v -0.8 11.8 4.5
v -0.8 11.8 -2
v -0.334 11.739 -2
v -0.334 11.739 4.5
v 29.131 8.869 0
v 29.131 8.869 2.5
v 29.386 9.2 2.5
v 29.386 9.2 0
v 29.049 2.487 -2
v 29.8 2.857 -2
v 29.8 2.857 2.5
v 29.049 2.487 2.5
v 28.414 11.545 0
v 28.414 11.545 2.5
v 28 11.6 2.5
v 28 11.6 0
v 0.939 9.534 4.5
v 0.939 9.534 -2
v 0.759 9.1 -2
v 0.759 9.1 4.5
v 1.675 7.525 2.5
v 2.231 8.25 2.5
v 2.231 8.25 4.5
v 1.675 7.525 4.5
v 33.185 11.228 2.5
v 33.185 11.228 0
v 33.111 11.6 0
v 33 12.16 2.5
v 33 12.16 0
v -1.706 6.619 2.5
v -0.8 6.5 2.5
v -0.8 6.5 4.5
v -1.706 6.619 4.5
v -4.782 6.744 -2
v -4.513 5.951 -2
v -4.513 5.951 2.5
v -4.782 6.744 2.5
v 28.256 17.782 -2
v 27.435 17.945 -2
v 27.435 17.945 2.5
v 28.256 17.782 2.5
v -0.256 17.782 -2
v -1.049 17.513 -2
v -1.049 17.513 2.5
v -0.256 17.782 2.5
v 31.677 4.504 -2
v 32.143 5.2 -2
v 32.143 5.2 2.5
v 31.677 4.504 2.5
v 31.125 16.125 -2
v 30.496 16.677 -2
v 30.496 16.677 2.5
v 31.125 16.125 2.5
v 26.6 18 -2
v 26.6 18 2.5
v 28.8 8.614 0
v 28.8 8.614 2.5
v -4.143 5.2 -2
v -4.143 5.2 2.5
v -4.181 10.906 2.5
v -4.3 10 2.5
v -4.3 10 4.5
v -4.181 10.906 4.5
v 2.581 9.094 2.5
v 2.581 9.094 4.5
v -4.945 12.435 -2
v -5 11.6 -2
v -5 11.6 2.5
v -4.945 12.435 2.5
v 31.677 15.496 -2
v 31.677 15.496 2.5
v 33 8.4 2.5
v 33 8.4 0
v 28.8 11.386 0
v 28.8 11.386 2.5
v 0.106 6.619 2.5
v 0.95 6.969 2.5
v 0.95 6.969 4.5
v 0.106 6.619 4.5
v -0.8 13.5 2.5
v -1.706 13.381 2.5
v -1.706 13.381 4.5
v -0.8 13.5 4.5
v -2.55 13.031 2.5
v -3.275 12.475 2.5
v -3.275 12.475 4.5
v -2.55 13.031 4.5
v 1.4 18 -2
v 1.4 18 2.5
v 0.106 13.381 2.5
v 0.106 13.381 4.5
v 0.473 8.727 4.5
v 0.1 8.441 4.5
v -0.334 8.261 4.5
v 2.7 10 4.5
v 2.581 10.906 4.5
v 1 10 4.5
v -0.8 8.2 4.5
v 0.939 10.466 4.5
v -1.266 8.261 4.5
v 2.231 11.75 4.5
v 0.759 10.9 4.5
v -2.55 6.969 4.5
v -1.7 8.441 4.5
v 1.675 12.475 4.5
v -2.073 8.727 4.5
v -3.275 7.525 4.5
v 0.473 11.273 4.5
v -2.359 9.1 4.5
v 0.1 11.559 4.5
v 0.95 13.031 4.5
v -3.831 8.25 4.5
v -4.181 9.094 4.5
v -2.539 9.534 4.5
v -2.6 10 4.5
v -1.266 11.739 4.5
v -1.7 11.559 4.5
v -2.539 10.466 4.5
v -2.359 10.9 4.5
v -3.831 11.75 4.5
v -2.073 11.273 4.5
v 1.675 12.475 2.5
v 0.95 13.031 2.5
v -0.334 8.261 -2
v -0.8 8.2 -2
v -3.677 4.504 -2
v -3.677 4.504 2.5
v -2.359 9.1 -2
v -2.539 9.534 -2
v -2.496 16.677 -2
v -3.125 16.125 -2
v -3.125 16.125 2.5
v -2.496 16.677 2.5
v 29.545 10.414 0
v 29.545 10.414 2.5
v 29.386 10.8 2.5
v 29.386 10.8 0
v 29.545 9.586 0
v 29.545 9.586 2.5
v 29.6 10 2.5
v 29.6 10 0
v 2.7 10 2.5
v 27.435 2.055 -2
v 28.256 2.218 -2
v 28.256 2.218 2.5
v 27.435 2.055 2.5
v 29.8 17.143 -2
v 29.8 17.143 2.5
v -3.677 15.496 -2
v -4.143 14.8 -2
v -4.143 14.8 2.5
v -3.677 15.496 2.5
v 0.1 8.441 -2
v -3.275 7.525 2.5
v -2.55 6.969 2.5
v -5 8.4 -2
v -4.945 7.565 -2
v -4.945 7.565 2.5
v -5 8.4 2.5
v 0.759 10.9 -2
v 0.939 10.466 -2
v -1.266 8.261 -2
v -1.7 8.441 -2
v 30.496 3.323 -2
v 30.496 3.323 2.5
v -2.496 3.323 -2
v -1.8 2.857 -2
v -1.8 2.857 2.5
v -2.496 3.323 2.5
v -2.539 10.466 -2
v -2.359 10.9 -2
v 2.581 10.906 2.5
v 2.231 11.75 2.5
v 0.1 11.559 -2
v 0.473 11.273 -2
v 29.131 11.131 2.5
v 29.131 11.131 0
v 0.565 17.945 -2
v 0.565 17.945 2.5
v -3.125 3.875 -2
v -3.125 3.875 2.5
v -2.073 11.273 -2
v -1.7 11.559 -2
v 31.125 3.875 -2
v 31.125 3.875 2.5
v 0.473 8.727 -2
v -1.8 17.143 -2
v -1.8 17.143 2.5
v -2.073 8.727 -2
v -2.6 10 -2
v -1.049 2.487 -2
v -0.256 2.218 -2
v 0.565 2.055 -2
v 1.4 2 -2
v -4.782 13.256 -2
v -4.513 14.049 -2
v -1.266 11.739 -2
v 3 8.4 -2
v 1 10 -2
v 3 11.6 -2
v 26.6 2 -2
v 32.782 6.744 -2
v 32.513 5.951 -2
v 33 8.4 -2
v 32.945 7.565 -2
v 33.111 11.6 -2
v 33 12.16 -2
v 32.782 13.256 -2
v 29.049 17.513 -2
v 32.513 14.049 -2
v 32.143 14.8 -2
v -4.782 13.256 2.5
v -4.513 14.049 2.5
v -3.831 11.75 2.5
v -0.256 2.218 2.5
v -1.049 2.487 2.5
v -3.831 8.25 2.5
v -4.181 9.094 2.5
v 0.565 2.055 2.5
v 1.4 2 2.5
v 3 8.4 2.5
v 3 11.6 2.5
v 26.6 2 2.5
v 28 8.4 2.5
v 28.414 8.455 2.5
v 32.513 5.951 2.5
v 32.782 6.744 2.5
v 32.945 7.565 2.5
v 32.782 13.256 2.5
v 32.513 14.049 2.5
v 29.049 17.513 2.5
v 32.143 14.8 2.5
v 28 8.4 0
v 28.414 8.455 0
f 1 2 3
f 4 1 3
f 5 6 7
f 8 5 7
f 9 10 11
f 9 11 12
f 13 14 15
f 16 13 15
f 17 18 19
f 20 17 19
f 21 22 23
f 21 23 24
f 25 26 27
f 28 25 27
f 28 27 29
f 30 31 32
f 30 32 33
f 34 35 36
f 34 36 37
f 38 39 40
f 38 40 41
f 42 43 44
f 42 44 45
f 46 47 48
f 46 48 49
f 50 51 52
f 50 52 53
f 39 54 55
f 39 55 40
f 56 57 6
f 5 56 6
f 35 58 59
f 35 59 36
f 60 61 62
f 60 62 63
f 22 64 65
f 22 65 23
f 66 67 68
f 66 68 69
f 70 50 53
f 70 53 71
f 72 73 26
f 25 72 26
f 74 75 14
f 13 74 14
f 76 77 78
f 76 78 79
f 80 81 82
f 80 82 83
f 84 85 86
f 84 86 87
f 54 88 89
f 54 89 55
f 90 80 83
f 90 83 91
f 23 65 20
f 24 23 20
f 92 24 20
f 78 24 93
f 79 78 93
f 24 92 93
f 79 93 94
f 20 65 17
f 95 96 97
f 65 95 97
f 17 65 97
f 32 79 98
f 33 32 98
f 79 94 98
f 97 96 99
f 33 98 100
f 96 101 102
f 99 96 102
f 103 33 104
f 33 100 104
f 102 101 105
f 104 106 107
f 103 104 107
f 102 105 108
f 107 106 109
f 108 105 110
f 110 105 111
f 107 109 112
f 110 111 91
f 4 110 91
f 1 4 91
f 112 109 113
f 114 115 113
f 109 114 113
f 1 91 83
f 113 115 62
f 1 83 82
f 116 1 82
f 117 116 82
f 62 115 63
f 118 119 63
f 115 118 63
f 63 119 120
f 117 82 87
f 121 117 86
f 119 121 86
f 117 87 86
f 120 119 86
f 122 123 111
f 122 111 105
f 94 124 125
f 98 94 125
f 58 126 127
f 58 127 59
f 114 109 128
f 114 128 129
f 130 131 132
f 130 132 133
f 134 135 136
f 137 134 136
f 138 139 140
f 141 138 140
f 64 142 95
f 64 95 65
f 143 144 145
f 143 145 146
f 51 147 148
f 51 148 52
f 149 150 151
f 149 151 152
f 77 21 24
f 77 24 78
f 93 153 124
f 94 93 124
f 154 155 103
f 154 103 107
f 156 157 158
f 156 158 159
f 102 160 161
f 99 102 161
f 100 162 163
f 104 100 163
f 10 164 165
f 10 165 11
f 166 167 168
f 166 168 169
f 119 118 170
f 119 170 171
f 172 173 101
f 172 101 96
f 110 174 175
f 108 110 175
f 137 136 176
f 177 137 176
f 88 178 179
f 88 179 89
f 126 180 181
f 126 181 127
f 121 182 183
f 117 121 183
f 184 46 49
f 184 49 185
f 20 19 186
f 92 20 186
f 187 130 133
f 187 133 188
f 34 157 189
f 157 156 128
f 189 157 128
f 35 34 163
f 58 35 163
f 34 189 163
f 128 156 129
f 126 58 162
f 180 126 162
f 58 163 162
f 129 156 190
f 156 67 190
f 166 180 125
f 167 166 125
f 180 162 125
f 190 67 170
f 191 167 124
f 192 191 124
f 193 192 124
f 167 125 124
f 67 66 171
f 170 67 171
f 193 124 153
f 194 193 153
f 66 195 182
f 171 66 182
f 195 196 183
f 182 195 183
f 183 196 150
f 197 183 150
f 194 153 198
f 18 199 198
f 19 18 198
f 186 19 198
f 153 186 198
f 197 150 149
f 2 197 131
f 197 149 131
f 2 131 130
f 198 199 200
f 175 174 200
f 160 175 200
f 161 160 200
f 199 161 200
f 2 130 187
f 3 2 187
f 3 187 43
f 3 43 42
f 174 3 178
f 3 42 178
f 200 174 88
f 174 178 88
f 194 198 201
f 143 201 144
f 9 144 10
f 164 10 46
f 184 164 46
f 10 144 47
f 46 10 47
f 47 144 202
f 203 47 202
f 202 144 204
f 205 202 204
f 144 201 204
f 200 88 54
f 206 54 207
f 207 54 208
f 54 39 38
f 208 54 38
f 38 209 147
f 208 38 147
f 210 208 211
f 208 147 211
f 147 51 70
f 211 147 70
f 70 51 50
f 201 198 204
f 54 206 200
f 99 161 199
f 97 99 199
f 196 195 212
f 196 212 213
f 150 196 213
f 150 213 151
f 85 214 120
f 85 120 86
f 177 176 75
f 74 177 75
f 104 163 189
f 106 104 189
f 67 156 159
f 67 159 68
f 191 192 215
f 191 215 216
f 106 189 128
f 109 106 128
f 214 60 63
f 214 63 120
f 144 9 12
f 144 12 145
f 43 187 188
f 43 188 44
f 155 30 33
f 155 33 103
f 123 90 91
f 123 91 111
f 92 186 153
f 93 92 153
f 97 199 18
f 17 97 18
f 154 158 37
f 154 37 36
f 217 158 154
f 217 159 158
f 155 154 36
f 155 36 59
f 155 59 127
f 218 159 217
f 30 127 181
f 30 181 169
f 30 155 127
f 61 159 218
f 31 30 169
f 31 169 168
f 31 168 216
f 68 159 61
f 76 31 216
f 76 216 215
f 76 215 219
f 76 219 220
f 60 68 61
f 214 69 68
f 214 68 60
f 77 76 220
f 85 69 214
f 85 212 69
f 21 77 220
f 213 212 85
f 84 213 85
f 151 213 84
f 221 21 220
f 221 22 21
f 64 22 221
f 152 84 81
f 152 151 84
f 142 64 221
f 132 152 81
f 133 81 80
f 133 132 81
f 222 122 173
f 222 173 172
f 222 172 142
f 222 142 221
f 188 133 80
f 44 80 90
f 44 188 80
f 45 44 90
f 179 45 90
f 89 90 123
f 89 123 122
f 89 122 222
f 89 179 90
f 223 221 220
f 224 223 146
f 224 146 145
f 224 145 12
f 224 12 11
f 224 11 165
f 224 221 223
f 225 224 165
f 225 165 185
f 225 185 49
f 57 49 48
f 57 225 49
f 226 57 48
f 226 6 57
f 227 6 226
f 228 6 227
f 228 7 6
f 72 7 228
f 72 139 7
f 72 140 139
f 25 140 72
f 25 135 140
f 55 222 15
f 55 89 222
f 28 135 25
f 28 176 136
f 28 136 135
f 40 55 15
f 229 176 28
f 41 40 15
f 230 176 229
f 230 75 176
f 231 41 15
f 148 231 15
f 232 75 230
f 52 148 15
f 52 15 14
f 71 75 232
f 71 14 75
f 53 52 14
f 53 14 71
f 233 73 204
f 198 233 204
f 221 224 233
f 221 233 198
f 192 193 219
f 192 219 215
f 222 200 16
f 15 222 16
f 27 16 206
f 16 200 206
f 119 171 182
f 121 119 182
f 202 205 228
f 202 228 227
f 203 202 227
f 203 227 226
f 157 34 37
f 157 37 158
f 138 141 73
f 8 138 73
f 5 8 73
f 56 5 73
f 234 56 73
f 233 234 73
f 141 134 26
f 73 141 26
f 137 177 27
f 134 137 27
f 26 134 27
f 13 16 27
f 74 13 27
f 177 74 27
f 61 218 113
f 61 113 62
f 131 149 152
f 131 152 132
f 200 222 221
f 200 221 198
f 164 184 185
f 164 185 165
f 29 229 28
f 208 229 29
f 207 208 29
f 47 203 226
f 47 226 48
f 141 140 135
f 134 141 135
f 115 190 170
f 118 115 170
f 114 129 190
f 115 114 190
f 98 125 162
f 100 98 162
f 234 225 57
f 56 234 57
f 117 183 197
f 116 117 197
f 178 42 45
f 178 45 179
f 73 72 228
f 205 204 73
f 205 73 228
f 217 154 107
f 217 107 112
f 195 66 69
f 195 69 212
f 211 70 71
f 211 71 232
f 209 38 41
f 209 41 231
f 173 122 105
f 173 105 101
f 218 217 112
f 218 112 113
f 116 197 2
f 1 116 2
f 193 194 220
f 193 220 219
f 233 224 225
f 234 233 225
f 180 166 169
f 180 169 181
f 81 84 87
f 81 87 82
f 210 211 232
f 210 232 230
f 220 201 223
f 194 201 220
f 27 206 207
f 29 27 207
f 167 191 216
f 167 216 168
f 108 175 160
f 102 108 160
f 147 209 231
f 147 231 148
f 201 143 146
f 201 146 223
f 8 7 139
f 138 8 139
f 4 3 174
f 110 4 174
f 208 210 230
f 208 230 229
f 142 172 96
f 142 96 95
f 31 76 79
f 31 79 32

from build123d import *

# Parameters (mm, degrees)
BOSS_EXTRUDE1_DEPTH = 4.5
CUT_EXTRUDE1_DEPTH  = 2.5
CUT_EXTRUDE2_DEPTH  = 0.414110472
CUT_EXTRUDE3_DEPTH  = 0.414110472
CUT_EXTRUDE4_DEPTH  = 0.385889528
CUT_EXTRUDE5_DEPTH  = 0.385889528
CUT_EXTRUDE6_DEPTH  = 0.33137085
CUT_EXTRUDE7_DEPTH  = 0.33137085
CUT_EXTRUDE8_DEPTH  = 0.254269796
SKETCH10_W          = 5
SKETCH10_H          = 2
CUT_EXTRUDE9_DEPTH  = 0.214359354
CUT_EXTRUDE10_DEPTH = 0.254269796
SKETCH12_W          = 5
SKETCH12_H          = 2
CUT_EXTRUDE11_DEPTH = 0.214359354
SKETCH13_W          = 4.5
SKETCH13_H          = 3.2
CUT_EXTRUDE12_DEPTH = 25
BOSS_EXTRUDE2_DEPTH = 2
CUT_EXTRUDE13_DEPTH = 39.14773912
DRAFT1_START        = -2
DRAFT1_DEPTH        = 4.5
DRAFT1_2_DEPTH      = 2.5
DRAFT1_3_DEPTH      = 2


# Read off the part's stored shape, not the designer's step: Draft1
with BuildPart() as part:
    # Sketch1 → Boss-Extrude1 (new body)
    with BuildSketch(Plane(origin=(0, 0, -2), x_dir=(-1, 0, 0), z_dir=(0, 0, -1))):
        Polygon((-33, 12.160106278), (-33, 7.839893722), (-32.781925288, 6.743558111), (-32.512829008, 5.950826033), (-32.142562584, 5.2), (-31.677461378, 4.503926854), (-31.1254834, 3.8745166), (-30.496073146, 3.322538622), (-29.8, 2.857437416), (-29.049173967, 2.487170992), (-28.256441889, 2.218074712), (-27.43536763, 2.054752887), (-26.6, 2), (-1.4, 2), (-0.56463237, 2.054752887), (0.256441889, 2.218074712), (1.049173967, 2.487170992), (1.8, 2.857437416), (2.496073146, 3.322538622), (3.1254834, 3.8745166), (3.677461378, 4.503926854), (4.142562584, 5.2), (4.512829008, 5.950826033), (4.781925288, 6.743558111), (4.945247113, 7.56463237), (5, 8.4), (5, 11.6), (4.945247113, 12.43536763), (4.781925288, 13.256441889), (4.512829008, 14.049173967), (4.142562584, 14.8), (3.677461378, 15.496073146), (3.1254834, 16.1254834), (2.496073146, 16.677461378), (1.8, 17.142562584), (1.049173967, 17.512829008), (0.256441889, 17.781925288), (-0.56463237, 17.945247113), (-1.4, 18), (-26.6, 18), (-27.43536763, 17.945247113), (-28.256441889, 17.781925288), (-29.049173967, 17.512829008), (-29.8, 17.142562584), (-30.496073146, 16.677461378), (-31.1254834, 16.1254834), (-31.677461378, 15.496073146), (-32.142562584, 14.8), (-32.512829008, 14.049173967), (-32.781925288, 13.256441889), align=None)
    extrude(amount=-BOSS_EXTRUDE1_DEPTH)

    # Sketch2 → Cut-Extrude1 (cut)
    with BuildSketch(Plane.XY.offset(2.5)):
        Polygon((29.6, 10), (29.545481322, 10.414110472), (29.385640646, 10.8), (29.13137085, 11.13137085), (28.8, 11.385640646), (28.414110472, 11.545481322), (28, 11.6), (28, 8.4), (28.414110472, 8.454518678), (28.8, 8.614359354), (29.13137085, 8.86862915), (29.385640646, 9.2), (29.545481322, 9.585889528), align=None)
    extrude(amount=-CUT_EXTRUDE1_DEPTH, mode=Mode.SUBTRACT)

    # Sketch3 → Cut-Extrude2 (cut)
    with BuildSketch(Plane.XZ.offset(-10)):
        Polygon((28, 0), (28, -2), (33, -2), (33, 0), (29.545481322, 0), align=None)
    extrude(amount=-CUT_EXTRUDE2_DEPTH, mode=Mode.SUBTRACT)

    # Sketch4 → Cut-Extrude3 (cut)
    with BuildSketch(Plane(origin=(0, 10, 0), x_dir=(-1, 0, 0), z_dir=(0, 1, 0))):
        Polygon((-28, -2), (-28, 0), (-29.545481322, 0), (-33, 0), (-33, -2), align=None)
    extrude(amount=-CUT_EXTRUDE3_DEPTH, mode=Mode.SUBTRACT)

    # Sketch5 → Cut-Extrude4 (cut)
    with BuildSketch(Plane.XZ.offset(-10.414110472)):
        Polygon((28, 0), (28, -2), (33, -2), (33, 0), (29.385640646, 0), align=None)
    extrude(amount=-CUT_EXTRUDE4_DEPTH, mode=Mode.SUBTRACT)

    # Sketch6 → Cut-Extrude5 (cut)
    with BuildSketch(Plane(origin=(0, 9.585889528, 0), x_dir=(-1, 0, 0), z_dir=(0, 1, 0))):
        Polygon((-28, -2), (-28, 0), (-29.385640646, 0), (-33, 0), (-33, -2), align=None)
    extrude(amount=-CUT_EXTRUDE5_DEPTH, mode=Mode.SUBTRACT)

    # Sketch7 → Cut-Extrude6 (cut)
    with BuildSketch(Plane.XZ.offset(-10.8)):
        Polygon((28, 0), (28, -2), (33, -2), (33, 0), (29.13137085, 0), align=None)
    extrude(amount=-CUT_EXTRUDE6_DEPTH, mode=Mode.SUBTRACT)

    # Sketch8 → Cut-Extrude7 (cut)
    with BuildSketch(Plane(origin=(0, 9.2, 0), x_dir=(-1, 0, 0), z_dir=(0, 1, 0))):
        Polygon((-28, -2), (-28, 0), (-29.13137085, 0), (-33, 0), (-33, -2), align=None)
    extrude(amount=-CUT_EXTRUDE7_DEPTH, mode=Mode.SUBTRACT)

    # Sketch9 → Cut-Extrude8 (cut)
    with BuildSketch(Plane.XZ.offset(-11.13137085)):
        Polygon((28, 0), (28, -2), (33, -2), (33, 0), (28.8, 0), align=None)
    extrude(amount=-CUT_EXTRUDE8_DEPTH, mode=Mode.SUBTRACT)

    # Sketch10 → Cut-Extrude9 (cut)
    with BuildSketch(Plane.XZ.offset(-11.385640646)):
        with Locations((30.5, -1)):
            Rectangle(SKETCH10_W, SKETCH10_H)
    extrude(amount=-CUT_EXTRUDE9_DEPTH, mode=Mode.SUBTRACT)

    # Sketch11 → Cut-Extrude10 (cut)
    with BuildSketch(Plane(origin=(0, 8.86862915, 0), x_dir=(-1, 0, 0), z_dir=(0, 1, 0))):
        Polygon((-28, -2), (-28, 0), (-28.8, 0), (-33, 0), (-33, -2), align=None)
    extrude(amount=-CUT_EXTRUDE10_DEPTH, mode=Mode.SUBTRACT)

    # Sketch12 → Cut-Extrude11 (cut)
    with BuildSketch(Plane(origin=(0, 8.614359354, 0), x_dir=(-1, 0, 0), z_dir=(0, 1, 0))):
        with Locations((-30.5, -1)):
            Rectangle(SKETCH12_W, SKETCH12_H)
    extrude(amount=-CUT_EXTRUDE11_DEPTH, mode=Mode.SUBTRACT)

    # Sketch13 → Cut-Extrude12 (cut)
    with BuildSketch(Plane(origin=(28, 0, 0), x_dir=(0, 0, -1), z_dir=(1, 0, 0))):
        with Locations((-0.25, 10)):
            Rectangle(SKETCH13_W, SKETCH13_H)
    extrude(amount=-CUT_EXTRUDE12_DEPTH, mode=Mode.SUBTRACT)

    # Sketch14 → Boss-Extrude2 (add)
    with BuildSketch(Plane.XY.offset(2.5)):
        Polygon((1.674873734, 12.474873734), (2.231088913, 11.75), (2.580740392, 10.905866658), (2.7, 10), (2.580740392, 9.094133342), (2.231088913, 8.25), (1.674873734, 7.525126266), (0.95, 6.968911087), (0.105866658, 6.619259608), (-0.8, 6.5), (-1.705866658, 6.619259608), (-2.55, 6.968911087), (-3.274873734, 7.525126266), (-3.831088913, 8.25), (-4.180740392, 9.094133342), (-4.3, 10), (-4.180740392, 10.905866658), (-3.831088913, 11.75), (-3.274873734, 12.474873734), (-2.55, 13.031088913), (-1.705866658, 13.380740392), (-0.8, 13.5), (0.105866658, 13.380740392), (0.95, 13.031088913), align=None)
    extrude(amount=BOSS_EXTRUDE2_DEPTH)

    # Sketch15 → Cut-Extrude13 (cut, through all)
    with BuildSketch(Plane(origin=(0, 0, -2), x_dir=(-1, 0, 0), z_dir=(0, 0, -1))):
        Polygon((-0.938666487, 9.534125719), (-0.758845727, 9.1), (-0.472792206, 8.727207794), (-0.1, 8.441154273), (0.334125719, 8.261333513), (0.8, 8.2), (1.265874281, 8.261333513), (1.7, 8.441154273), (2.072792206, 8.727207794), (2.358845727, 9.1), (2.538666487, 9.534125719), (2.6, 10), (2.538666487, 10.465874281), (2.358845727, 10.9), (2.072792206, 11.272792206), (1.7, 11.558845727), (1.265874281, 11.738666487), (0.8, 11.8), (0.334125719, 11.738666487), (-0.1, 11.558845727), (-0.472792206, 11.272792206), (-0.758845727, 10.9), (-0.938666487, 10.465874281), (-1, 10), align=None)
    extrude(amount=-CUT_EXTRUDE13_DEPTH, mode=Mode.SUBTRACT)

    # Draft1 outline → Draft1 (cut)
    with BuildSketch(Plane.XY.offset(DRAFT1_START)):
        Polygon((33, 8.399999998), (32.945247113, 7.56463237), (33, 7.839893722), align=None)
    extrude(amount=DRAFT1_DEPTH, mode=Mode.SUBTRACT)

    # Draft1 2 outline → Draft1 2 (add)
    with BuildSketch(Plane.XY):
        Polygon((33, 8.399999998), (33.185369442, 11.228191161), (33, 12.160106278), align=None)
    extrude(amount=DRAFT1_2_DEPTH)

    # Draft1 3 outline → Draft1 3 (add)
    with BuildSketch(Plane.XY.offset(DRAFT1_START)):
        Polygon((33, 12.160106278), (33, 11.6), (33.111412066, 11.6), align=None)
    extrude(amount=DRAFT1_3_DEPTH)


solid = part.part
